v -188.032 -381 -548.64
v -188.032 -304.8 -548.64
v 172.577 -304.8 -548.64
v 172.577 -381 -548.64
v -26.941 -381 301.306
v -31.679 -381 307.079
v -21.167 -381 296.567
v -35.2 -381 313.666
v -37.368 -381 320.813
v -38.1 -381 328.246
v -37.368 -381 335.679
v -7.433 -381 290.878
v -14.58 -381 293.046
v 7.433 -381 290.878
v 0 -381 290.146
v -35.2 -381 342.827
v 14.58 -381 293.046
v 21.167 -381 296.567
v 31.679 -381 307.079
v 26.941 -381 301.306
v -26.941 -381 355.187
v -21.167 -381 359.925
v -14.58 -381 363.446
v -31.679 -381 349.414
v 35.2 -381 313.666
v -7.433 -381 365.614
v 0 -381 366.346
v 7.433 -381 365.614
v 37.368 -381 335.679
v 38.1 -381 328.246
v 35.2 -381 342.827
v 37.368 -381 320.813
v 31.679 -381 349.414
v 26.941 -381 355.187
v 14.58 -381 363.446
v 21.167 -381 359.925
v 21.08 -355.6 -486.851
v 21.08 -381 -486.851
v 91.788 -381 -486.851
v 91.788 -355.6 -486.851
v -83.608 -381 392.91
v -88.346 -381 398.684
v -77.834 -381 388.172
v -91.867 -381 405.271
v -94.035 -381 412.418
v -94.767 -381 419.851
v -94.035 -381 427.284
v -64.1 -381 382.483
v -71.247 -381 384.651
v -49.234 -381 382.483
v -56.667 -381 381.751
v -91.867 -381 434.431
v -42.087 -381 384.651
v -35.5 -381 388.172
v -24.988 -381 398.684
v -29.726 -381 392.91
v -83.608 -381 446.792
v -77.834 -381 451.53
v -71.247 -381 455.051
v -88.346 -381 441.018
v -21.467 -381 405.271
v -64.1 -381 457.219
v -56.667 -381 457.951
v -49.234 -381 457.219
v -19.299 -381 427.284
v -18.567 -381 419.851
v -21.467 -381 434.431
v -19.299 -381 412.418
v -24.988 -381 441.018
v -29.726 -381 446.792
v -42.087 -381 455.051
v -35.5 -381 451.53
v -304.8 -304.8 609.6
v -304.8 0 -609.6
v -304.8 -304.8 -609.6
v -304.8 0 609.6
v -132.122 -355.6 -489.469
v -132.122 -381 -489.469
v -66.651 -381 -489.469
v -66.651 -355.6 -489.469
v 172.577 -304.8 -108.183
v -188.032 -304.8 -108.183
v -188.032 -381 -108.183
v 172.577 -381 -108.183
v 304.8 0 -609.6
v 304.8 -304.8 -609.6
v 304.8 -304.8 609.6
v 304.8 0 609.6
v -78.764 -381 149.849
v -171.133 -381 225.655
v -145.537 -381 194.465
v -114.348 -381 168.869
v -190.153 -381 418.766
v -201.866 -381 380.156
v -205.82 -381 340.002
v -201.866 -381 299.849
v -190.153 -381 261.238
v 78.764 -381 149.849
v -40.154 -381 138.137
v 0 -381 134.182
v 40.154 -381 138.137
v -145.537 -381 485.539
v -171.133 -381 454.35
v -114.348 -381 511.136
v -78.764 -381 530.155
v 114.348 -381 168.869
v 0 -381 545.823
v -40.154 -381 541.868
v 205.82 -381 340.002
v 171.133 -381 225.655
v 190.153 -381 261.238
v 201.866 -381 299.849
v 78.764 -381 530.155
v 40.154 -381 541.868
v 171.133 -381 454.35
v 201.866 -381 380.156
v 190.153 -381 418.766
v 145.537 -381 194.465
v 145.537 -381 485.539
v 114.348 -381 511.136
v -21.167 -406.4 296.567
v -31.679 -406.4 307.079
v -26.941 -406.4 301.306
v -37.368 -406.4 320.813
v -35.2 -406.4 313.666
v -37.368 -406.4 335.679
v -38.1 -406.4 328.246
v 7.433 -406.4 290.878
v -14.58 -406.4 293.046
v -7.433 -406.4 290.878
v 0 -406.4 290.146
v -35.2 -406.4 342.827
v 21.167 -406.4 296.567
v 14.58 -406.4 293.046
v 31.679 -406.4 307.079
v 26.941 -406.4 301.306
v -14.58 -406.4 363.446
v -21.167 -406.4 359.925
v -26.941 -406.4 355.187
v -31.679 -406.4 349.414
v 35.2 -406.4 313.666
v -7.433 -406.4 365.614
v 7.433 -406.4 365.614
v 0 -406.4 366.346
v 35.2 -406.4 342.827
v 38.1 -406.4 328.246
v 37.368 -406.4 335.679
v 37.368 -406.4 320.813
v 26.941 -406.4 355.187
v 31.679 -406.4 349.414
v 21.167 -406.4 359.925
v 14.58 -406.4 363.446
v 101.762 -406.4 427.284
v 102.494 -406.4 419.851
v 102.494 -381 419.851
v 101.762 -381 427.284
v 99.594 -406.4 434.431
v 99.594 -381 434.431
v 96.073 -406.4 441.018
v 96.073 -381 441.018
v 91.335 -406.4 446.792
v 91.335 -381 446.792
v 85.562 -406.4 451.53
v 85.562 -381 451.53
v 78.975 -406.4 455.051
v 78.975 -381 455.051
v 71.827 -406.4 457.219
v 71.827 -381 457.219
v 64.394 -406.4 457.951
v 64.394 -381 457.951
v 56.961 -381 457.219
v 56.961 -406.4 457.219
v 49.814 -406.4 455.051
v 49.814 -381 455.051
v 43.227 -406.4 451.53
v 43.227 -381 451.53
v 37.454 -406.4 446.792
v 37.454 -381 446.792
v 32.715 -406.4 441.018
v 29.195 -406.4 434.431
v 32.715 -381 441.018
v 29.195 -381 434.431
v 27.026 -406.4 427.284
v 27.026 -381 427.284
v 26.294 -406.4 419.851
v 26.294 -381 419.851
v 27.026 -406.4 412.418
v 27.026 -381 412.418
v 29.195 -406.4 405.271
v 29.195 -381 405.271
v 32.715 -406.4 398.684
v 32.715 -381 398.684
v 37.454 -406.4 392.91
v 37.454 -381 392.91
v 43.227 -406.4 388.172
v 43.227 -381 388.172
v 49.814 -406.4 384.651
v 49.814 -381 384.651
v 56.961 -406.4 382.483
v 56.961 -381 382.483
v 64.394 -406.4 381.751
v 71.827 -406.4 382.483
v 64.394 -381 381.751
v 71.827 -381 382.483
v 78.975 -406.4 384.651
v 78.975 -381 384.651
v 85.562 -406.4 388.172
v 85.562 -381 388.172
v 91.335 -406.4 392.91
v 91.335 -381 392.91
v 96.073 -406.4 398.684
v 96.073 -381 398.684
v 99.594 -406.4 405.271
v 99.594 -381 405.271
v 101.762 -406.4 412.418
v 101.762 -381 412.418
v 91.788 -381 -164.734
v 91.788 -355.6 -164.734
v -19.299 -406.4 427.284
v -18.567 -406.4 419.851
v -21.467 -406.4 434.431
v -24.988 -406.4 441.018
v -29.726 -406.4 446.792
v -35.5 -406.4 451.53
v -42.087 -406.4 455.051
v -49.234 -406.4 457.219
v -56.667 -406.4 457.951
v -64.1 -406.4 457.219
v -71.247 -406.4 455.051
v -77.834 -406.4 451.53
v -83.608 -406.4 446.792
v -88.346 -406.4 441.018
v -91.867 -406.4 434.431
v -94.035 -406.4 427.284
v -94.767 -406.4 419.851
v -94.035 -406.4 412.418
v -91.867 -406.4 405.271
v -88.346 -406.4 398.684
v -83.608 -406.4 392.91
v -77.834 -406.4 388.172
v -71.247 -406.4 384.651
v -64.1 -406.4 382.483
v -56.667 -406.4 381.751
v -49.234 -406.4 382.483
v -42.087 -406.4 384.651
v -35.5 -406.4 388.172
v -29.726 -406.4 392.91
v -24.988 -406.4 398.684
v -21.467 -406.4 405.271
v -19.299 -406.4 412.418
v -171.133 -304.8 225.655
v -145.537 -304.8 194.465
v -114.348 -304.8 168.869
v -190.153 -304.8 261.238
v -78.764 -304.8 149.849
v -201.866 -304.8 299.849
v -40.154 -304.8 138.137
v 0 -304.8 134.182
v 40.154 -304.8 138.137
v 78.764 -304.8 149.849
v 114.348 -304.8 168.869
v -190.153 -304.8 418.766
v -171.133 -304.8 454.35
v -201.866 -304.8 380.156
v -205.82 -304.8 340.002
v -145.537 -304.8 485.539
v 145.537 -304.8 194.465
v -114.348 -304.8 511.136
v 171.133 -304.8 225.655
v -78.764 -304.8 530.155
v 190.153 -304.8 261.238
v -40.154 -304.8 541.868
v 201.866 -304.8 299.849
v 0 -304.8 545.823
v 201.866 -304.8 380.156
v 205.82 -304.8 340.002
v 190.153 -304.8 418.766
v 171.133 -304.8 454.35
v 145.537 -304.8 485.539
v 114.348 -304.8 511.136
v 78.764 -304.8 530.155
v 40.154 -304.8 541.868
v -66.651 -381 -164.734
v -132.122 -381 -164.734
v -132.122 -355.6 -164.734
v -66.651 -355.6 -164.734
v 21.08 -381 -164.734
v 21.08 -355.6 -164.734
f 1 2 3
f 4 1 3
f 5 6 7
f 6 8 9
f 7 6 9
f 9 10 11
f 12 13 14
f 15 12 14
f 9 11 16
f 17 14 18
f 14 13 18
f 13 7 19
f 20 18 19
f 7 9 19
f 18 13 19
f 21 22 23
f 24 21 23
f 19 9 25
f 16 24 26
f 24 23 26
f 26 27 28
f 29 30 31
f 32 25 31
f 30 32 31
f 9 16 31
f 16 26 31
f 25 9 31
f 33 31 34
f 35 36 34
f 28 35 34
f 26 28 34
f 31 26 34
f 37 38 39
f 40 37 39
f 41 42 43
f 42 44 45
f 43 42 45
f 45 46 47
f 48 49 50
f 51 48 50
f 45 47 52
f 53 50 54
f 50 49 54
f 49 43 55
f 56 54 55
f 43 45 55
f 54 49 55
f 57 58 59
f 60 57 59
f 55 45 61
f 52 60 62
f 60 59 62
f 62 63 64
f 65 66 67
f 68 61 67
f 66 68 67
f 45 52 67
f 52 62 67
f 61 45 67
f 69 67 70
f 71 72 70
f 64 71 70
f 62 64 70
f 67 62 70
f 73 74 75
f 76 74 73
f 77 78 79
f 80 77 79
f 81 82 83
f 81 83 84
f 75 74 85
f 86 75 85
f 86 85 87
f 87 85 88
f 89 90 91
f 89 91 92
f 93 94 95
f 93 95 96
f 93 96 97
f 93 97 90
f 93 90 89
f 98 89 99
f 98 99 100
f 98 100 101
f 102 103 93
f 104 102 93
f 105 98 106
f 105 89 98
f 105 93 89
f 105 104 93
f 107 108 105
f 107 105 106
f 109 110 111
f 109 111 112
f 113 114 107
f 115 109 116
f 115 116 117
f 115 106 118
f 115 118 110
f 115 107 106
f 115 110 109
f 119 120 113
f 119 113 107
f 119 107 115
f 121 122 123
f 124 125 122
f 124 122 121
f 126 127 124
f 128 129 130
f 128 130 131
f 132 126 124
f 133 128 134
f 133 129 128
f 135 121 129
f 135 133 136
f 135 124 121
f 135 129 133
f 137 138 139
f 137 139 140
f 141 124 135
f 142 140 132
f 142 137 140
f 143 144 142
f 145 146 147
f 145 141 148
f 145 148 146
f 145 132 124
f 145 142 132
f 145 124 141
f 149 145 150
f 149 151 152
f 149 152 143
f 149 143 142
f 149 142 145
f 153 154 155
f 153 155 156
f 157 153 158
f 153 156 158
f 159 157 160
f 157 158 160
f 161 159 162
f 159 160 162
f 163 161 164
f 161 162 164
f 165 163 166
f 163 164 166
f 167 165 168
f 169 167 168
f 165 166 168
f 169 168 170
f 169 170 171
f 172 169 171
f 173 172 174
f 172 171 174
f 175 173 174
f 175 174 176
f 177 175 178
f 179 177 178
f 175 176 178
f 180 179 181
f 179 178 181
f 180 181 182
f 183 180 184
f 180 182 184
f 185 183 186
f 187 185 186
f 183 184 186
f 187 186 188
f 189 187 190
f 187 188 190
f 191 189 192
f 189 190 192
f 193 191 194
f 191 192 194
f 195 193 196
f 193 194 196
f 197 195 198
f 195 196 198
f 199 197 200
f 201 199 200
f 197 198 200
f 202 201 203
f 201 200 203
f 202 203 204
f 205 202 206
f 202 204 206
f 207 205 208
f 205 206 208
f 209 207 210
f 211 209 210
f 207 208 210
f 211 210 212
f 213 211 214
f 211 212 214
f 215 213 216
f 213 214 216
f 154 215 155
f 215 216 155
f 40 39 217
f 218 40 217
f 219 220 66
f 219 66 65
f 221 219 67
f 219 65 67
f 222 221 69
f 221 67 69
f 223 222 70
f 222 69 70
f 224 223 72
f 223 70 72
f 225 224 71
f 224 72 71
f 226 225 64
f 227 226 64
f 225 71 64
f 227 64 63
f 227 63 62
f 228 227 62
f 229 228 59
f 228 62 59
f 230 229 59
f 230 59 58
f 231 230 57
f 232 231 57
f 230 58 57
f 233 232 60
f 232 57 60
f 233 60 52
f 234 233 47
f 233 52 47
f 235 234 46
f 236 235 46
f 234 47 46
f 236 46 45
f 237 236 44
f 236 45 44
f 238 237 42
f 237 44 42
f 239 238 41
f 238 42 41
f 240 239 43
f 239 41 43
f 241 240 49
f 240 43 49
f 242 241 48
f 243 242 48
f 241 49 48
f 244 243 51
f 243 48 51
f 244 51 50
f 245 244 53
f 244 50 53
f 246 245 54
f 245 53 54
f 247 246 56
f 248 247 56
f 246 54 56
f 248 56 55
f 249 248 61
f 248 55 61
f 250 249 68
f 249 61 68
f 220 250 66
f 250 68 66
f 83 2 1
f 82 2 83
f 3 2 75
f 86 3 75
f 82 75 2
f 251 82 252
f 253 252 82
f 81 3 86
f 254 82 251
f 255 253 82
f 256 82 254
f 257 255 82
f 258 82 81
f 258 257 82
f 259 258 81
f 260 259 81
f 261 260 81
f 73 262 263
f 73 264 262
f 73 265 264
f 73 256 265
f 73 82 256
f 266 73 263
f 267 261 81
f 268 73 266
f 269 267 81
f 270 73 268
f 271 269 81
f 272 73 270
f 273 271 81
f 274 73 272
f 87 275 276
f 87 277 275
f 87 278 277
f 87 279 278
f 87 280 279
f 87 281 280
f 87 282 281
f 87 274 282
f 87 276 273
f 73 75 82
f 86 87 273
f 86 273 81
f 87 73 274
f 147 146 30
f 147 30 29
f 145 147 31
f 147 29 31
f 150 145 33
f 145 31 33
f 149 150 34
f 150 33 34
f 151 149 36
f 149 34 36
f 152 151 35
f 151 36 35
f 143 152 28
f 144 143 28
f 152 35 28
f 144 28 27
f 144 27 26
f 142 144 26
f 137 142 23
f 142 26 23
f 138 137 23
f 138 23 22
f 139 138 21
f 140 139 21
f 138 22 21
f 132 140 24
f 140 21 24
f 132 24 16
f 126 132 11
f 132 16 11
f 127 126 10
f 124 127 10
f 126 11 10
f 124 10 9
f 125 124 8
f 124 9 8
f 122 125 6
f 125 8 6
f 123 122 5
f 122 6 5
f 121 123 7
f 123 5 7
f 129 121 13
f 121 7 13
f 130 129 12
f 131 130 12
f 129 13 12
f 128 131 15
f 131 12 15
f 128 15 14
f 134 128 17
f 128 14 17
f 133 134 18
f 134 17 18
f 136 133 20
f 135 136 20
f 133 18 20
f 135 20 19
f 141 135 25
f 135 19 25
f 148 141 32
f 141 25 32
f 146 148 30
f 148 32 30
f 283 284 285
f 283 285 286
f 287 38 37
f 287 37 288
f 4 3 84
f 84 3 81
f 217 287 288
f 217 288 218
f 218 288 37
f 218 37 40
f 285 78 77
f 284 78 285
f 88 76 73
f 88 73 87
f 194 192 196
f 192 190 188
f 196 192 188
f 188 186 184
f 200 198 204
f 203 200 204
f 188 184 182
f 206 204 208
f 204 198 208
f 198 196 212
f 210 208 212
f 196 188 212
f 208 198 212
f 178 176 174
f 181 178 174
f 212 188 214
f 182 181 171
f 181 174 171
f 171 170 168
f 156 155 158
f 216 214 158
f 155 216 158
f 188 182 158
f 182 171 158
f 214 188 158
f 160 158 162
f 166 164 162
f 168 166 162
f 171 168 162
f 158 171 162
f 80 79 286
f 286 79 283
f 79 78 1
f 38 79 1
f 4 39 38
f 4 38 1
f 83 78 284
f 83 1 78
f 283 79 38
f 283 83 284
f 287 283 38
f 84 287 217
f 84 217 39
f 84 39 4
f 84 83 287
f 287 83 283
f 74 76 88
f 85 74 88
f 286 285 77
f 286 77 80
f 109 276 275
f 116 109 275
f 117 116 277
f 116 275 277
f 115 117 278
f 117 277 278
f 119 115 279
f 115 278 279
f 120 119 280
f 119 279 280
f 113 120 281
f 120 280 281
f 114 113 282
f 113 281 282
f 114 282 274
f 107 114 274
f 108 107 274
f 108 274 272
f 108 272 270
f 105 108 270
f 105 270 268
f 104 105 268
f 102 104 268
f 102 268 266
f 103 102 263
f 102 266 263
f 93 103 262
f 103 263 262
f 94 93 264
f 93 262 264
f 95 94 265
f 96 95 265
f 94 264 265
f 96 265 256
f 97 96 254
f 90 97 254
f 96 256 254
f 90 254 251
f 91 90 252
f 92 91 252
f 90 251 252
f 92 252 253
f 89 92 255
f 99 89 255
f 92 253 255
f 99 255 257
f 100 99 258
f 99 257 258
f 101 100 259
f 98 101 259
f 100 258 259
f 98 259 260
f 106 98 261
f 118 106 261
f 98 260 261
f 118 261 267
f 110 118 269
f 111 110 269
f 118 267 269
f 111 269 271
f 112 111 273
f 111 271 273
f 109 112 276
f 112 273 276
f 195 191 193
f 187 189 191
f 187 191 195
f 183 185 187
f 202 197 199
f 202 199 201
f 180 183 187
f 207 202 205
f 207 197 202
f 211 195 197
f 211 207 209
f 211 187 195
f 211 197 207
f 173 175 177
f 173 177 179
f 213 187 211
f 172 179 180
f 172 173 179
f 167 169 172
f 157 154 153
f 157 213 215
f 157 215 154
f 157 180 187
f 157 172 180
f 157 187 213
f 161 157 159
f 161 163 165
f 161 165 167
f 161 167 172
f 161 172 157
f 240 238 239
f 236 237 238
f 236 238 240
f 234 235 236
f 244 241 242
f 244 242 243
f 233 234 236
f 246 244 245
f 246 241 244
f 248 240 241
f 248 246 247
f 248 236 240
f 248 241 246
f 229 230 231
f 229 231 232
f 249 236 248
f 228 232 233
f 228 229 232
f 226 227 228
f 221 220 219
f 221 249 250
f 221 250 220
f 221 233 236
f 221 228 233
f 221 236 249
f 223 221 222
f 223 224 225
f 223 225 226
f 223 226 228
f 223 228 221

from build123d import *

# Parameters (mm, degrees)
F0_W      = 609.6
F0_H      = 1219.2
F1_DEPTH  = 304.8
F2_R      = 205.820361
F3_DEPTH  = 76.2
F4_W      = 360.608458
F4_H      = 440.457478
F5_DEPTH  = 76.2
F6_R      = 38.1
F9_DEPTH  = 25.4
F7_R      = 38.1
F10_DEPTH = 25.4
F8_R      = 38.1
F11_DEPTH = 25.4
F12_W     = 65.470778
F12_H     = 324.735075
F12_W_2   = 70.708439
F12_H_2   = 322.116256
F13_DEPTH = 25.4


with BuildPart() as f1:
    # F0 (on Front) → F1 (new body)
    with BuildSketch(Plane.XZ):
        Rectangle(F0_W, F0_H)
    extrude(amount=F1_DEPTH)

    # F2 (on face) → F3 (join)
    with BuildSketch(Plane.XZ.offset(304.8)):
        with Locations((0, 340.002239)):
            Circle(F2_R)
    extrude(amount=F3_DEPTH)

    # F4 (on face) → F5 (join)
    with BuildSketch(Plane.XZ.offset(304.8)):
        with Locations((-7.727325, -328.411274)):
            Rectangle(F4_W, F4_H)
    extrude(amount=F5_DEPTH)

    # F12 (on face) → F13 (cut)
    with BuildSketch(Plane.XZ.offset(381)):
        with Locations((-99.386383, -327.101872)):
            Rectangle(F12_W, F12_H)
        with Locations((56.434055, -325.792447)):
            Rectangle(F12_W_2, F12_H_2)
    extrude(amount=-F13_DEPTH, mode=Mode.SUBTRACT)


with BuildPart() as f9:
    # F6 (on face) → F9 (new body)
    with BuildSketch(Plane.XZ.offset(381)):
        with Locations((-56.667063, 419.851243)):
            Circle(F6_R)
    extrude(amount=F9_DEPTH)


with BuildPart() as f10:
    # F7 (on face) → F10 (new body)
    with BuildSketch(Plane.XZ.offset(381)):
        with Locations((64.394377, 419.851243)):
            Circle(F7_R)
    extrude(amount=F10_DEPTH)


with BuildPart() as f11:
    # F8 (on face) → F11 (new body)
    with BuildSketch(Plane.XZ.offset(381)):
        with Locations((0, 328.246292)):
            Circle(F8_R)
    extrude(amount=F11_DEPTH)


solid = Compound([f1.part, f9.part, f10.part, f11.part])
